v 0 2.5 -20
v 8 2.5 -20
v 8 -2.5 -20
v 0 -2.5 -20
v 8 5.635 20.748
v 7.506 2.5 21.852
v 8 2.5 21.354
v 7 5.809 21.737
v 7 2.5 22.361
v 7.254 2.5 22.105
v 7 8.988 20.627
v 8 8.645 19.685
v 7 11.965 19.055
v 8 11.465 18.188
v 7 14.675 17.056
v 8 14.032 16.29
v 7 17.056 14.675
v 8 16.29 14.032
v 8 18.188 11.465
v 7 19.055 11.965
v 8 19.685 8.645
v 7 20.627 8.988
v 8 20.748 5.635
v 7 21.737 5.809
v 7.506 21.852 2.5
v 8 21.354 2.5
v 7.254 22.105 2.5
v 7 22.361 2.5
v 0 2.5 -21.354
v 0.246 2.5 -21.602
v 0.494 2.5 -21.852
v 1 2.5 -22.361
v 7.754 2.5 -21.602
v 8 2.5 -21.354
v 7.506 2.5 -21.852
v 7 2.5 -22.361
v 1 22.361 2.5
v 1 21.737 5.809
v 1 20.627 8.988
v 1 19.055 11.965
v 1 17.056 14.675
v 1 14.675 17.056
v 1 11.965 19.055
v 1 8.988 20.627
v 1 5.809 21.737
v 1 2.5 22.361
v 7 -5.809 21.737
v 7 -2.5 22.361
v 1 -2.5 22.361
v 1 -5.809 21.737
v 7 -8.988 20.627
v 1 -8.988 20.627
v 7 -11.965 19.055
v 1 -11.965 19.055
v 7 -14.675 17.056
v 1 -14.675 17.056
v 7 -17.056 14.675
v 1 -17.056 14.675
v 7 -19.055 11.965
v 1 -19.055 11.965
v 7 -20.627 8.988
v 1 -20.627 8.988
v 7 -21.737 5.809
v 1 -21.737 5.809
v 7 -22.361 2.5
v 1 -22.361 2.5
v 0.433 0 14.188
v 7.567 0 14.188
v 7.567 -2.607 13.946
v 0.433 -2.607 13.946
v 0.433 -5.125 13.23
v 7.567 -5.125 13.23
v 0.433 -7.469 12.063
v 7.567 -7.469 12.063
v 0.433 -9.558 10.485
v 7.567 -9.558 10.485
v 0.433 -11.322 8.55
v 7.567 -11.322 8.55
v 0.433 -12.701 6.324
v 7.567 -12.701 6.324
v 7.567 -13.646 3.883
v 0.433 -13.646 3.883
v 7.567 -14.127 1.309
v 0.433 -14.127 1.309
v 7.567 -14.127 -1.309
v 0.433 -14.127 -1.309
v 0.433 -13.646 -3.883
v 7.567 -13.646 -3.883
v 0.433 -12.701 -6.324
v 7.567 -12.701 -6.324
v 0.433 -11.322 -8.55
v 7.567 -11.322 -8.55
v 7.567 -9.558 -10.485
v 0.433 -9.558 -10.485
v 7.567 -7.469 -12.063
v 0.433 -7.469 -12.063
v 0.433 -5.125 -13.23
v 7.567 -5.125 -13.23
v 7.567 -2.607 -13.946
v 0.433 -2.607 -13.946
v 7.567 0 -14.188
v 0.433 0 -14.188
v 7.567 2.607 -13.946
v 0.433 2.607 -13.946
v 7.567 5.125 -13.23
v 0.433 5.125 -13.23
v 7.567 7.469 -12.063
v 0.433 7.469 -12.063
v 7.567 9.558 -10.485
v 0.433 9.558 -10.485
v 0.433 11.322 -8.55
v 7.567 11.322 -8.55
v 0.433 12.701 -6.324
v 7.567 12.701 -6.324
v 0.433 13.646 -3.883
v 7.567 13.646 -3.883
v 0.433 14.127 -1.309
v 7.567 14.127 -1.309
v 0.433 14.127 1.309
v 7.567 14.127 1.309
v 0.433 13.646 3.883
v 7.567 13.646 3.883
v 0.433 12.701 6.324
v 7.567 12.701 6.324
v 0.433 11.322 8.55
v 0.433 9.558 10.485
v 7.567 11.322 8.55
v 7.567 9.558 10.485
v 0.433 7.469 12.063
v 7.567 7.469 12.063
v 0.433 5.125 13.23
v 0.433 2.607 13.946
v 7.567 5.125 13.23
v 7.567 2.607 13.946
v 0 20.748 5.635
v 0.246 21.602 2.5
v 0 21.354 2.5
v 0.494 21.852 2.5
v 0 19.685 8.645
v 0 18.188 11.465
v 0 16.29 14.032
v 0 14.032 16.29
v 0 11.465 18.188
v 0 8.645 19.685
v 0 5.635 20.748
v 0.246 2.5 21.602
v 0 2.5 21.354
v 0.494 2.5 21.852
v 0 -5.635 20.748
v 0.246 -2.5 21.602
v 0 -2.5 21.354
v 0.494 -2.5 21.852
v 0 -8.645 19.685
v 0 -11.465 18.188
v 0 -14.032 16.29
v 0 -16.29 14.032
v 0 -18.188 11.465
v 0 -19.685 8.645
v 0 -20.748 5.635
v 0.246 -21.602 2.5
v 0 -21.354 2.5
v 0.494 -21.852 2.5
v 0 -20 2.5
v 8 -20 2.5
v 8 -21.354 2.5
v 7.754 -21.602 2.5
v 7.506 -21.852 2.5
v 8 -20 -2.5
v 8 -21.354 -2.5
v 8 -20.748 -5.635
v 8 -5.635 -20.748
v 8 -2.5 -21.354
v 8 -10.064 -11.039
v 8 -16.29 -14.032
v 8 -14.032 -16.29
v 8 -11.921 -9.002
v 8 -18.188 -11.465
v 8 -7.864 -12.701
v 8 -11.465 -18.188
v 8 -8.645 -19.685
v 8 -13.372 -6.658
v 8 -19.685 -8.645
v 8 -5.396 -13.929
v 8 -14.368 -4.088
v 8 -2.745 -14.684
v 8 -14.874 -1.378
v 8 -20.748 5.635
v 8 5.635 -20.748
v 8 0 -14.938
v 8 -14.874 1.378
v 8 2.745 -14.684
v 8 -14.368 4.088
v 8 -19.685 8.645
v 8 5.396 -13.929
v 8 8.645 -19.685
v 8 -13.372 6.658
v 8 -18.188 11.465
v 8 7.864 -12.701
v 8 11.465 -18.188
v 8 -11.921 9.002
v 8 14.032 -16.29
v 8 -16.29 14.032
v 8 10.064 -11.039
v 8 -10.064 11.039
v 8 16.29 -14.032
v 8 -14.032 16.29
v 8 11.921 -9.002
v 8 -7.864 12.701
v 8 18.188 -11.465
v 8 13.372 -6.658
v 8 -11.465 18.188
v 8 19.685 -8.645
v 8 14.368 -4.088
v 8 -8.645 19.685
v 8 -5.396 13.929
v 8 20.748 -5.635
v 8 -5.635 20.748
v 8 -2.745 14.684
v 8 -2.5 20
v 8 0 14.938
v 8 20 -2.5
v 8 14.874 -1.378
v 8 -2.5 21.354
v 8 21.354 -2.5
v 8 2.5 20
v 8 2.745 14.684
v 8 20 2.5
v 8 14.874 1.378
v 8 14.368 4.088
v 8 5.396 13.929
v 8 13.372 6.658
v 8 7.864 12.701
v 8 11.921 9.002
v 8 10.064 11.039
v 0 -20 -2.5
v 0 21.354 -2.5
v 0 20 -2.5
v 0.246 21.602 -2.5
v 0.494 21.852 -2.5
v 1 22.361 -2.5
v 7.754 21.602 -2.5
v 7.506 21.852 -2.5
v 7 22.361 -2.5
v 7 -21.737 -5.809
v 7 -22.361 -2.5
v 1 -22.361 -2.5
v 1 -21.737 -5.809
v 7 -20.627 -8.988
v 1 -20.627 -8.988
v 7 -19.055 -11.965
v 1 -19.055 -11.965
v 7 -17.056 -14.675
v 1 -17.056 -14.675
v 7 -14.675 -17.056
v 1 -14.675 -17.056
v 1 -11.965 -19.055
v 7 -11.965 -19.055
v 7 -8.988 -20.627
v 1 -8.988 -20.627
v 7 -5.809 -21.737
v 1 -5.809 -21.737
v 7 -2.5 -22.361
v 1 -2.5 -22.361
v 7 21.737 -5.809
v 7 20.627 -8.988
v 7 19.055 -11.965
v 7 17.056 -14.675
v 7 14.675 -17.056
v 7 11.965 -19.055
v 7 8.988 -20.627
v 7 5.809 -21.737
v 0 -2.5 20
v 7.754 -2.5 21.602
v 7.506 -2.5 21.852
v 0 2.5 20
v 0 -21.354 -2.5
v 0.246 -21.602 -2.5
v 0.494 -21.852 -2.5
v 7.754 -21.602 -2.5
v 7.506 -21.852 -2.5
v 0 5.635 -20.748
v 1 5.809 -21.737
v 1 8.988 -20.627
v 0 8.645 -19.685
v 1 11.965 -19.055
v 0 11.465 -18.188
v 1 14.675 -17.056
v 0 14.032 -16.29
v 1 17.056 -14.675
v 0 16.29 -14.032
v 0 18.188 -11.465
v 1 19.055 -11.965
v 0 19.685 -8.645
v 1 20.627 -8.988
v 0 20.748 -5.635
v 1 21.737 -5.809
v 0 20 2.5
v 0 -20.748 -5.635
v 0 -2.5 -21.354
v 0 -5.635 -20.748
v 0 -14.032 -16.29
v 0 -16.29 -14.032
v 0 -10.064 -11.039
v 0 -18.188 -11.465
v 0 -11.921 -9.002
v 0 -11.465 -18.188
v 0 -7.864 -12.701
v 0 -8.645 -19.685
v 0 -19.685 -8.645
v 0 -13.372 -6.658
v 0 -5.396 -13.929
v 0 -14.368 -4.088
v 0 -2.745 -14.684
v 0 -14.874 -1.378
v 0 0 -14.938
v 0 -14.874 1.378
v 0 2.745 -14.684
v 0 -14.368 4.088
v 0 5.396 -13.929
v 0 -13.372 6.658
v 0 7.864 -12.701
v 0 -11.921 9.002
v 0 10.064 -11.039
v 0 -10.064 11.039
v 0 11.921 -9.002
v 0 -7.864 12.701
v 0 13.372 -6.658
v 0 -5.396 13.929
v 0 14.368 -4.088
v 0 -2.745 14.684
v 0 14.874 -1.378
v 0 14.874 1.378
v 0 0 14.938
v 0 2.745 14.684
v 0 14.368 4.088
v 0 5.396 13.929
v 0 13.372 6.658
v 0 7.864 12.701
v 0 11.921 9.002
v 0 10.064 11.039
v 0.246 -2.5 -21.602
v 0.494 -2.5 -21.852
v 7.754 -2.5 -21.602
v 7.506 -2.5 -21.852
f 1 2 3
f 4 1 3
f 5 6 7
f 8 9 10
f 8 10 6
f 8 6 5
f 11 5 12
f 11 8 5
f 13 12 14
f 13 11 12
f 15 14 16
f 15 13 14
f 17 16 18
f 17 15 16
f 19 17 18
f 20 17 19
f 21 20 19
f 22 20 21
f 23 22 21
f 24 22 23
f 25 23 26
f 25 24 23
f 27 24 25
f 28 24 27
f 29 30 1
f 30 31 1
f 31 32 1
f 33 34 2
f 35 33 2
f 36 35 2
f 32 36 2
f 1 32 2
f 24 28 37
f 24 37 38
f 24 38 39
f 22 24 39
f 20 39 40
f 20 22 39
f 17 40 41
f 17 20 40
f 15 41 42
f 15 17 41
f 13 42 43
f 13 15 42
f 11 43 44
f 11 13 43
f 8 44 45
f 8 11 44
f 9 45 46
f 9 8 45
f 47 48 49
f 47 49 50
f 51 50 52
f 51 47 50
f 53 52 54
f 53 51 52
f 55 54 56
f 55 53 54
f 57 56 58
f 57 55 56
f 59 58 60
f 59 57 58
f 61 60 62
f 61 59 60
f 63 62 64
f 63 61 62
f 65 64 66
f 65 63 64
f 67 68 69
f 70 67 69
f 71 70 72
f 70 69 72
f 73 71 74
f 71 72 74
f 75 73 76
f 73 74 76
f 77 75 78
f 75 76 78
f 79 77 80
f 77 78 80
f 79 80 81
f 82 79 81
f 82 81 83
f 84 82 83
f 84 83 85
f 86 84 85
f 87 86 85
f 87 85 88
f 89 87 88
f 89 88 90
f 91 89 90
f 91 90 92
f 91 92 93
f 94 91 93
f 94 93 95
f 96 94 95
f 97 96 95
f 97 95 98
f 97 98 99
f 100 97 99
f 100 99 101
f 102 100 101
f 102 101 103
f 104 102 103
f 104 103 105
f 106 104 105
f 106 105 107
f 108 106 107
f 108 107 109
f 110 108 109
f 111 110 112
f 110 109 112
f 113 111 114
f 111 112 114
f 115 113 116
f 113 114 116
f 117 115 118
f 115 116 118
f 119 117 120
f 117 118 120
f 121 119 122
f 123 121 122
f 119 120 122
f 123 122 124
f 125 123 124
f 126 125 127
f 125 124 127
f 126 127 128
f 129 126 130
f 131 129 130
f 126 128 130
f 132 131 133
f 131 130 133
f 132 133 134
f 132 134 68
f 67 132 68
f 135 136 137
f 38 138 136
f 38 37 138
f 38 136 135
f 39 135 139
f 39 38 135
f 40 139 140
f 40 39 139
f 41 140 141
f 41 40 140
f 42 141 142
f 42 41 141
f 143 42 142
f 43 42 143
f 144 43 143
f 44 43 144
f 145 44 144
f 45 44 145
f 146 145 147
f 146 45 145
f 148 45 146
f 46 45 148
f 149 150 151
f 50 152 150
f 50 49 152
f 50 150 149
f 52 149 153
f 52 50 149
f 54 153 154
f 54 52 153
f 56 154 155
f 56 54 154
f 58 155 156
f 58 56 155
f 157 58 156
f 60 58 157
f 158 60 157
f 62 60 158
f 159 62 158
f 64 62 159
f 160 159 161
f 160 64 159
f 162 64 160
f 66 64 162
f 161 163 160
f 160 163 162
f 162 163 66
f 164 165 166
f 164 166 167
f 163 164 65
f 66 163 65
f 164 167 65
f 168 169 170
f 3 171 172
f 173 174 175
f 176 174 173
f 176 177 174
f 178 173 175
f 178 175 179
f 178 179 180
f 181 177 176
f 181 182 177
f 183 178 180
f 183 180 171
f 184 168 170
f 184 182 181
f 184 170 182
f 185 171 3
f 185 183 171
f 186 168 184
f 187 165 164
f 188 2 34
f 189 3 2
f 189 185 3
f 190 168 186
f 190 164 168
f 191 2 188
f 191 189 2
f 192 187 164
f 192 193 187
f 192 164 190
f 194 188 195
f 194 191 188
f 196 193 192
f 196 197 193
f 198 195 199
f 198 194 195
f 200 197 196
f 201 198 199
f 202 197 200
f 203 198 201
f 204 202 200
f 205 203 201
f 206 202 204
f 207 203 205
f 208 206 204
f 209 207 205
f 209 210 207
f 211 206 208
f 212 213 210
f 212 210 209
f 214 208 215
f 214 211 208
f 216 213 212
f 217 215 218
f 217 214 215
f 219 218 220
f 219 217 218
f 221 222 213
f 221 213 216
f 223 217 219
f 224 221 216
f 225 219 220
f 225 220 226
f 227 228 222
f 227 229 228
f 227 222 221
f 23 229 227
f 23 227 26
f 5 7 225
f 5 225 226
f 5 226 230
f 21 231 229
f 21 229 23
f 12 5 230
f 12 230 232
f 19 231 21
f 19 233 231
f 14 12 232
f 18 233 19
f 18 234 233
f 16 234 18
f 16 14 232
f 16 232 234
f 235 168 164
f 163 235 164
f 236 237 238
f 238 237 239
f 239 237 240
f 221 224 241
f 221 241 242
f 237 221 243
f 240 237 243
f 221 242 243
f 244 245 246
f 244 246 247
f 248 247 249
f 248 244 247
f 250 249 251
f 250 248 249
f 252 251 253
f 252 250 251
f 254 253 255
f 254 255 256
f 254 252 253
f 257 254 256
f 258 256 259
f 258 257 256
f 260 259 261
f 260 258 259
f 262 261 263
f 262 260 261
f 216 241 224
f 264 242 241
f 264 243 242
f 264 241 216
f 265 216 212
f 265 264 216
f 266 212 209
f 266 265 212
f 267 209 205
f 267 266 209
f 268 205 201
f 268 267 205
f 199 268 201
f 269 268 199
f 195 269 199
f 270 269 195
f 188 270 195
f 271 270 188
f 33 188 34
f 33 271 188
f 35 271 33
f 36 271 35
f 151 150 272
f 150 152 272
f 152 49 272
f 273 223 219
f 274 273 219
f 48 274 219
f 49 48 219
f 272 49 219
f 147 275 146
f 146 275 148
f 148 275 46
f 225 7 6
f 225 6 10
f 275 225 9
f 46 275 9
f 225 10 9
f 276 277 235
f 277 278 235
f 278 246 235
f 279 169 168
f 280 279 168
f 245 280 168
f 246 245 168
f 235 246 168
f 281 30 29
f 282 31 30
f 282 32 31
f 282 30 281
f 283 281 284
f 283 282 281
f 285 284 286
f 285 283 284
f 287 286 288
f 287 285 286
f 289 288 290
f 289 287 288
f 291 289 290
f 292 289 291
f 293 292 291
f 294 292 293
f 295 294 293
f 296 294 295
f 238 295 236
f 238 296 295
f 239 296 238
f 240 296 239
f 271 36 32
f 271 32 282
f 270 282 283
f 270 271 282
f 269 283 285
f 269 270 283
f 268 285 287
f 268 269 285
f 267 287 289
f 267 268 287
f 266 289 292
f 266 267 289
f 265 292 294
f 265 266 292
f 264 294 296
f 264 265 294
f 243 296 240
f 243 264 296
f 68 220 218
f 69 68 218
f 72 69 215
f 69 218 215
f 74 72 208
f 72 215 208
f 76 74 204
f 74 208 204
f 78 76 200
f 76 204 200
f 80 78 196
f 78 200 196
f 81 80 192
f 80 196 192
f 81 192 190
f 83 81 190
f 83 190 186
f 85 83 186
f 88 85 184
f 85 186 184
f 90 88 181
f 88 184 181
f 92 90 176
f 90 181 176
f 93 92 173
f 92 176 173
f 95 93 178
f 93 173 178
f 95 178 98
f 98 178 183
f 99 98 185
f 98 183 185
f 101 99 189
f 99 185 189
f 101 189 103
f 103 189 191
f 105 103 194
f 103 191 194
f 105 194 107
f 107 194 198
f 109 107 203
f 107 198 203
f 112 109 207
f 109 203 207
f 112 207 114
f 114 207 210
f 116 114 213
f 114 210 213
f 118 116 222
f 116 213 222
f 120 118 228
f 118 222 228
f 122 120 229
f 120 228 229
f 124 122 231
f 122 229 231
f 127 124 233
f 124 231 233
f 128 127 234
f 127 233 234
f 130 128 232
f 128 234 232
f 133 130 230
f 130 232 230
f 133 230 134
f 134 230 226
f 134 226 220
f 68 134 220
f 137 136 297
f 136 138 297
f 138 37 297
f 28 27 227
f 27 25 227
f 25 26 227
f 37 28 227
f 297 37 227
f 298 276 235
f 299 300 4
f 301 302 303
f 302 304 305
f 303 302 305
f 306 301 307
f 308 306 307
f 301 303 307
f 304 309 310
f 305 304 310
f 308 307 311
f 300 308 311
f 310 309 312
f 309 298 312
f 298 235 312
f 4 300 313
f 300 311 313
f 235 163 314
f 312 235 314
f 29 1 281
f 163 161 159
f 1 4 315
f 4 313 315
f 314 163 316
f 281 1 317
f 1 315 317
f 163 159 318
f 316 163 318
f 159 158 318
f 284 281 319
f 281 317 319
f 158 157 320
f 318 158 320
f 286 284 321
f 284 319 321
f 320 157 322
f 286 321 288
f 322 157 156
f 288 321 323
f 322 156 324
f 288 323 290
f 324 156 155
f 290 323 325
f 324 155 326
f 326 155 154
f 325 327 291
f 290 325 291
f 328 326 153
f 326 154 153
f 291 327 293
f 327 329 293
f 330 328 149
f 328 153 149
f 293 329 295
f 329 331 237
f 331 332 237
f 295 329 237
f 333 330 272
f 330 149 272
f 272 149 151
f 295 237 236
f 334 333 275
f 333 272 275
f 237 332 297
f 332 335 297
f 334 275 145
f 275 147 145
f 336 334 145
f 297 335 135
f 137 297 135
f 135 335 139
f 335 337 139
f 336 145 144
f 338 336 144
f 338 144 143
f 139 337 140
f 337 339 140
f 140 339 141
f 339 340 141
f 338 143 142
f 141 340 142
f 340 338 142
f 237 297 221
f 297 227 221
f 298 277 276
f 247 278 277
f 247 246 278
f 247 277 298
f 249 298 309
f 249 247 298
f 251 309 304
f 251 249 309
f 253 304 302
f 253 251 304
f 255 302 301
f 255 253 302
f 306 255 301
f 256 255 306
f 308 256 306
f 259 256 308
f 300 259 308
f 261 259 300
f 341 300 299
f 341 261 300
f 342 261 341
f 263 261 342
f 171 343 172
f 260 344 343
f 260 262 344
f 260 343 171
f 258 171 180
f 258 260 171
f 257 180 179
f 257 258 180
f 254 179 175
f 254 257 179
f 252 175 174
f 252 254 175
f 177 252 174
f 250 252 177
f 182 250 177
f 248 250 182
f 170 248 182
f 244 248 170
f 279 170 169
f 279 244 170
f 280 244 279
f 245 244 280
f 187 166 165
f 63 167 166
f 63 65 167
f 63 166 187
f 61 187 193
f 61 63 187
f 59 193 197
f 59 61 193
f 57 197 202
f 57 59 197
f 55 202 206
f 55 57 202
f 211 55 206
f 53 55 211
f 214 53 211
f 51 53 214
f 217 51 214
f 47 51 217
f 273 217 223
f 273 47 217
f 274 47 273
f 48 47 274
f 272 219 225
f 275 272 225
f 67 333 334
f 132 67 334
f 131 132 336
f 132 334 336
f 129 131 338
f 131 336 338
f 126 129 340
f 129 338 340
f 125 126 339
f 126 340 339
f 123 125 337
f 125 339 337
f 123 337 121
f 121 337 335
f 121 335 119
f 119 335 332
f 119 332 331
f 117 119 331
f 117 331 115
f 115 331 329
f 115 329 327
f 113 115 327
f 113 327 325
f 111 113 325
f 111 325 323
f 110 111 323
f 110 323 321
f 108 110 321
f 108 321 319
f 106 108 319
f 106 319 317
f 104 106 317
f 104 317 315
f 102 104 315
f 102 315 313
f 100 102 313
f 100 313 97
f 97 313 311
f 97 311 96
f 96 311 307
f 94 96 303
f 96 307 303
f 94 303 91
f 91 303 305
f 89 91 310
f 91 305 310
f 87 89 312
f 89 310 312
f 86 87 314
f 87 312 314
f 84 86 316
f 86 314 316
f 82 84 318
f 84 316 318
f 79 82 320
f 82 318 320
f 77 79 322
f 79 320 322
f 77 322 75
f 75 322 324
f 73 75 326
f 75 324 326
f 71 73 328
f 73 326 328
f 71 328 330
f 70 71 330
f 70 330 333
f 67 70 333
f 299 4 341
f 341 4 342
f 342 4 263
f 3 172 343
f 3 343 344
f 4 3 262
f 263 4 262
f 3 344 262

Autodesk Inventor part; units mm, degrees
ref_plane "YZ Plane" through (0, 0, 0) normal (1, 0, 0) x (0, 1, 0)
ref_plane "XZ Plane" through (0, 0, 0) normal (0, 1, 0) x (-1, 0, 0)
sketch "草图1" plane through (0, 0, 0) normal (0, 0, 1) x (1, 0, 0)
  line L0 (0, 0) -> (8, 0)
  line L1 (0, 0) -> (0, 22.5)
  line L2 (0, 22.5) -> (8, 22.5)
  line L3 (8, 22.5) -> (8, 0)
  line L4 (0, 27) -> (0, -4.5) projected
  line L5 (-1.6, 0) -> (9.6, 0) projected
  dimension "d1" = 45
  dimension "d2" = 8
revolve "轴承体" add sketch "草图1" angle 360 about axis through (0, 0, 0) along (1, 0, 0)
sketch "草图2" plane through (0, 0, 0) normal (-1, 0, 0) x (0, 0, 1)
  circle A0 centre (0, 0) radius 22.5 projected
  point P0 (0, 0)
hole "螺纹" at (0, 0, 0) direction (1, 0, 0) diameter 28.376 end through all thread size "M30x1.5" class "6H" standard "GB Metric profile"
sketch "草图3" plane through (8, 0, 0) normal (1, 0, 0) x (0, 0, -1)
  circle A0 centre (0, 0) radius 22.5 projected
  line L0 (-2.5, 22.3607) -> (-2.5, 20)
  line L1 (-2.5, 20) -> (2.5, 20)
  line L2 (2.5, 20) -> (2.5, 22.3607)
  line L3 (0, -31.5) -> (0, 31.5) projected
  line L4 (-31.5, 0) -> (31.5, 0) projected
  dimension "d12" = 2.5
  dimension "d13" = 2.5
  dimension "d14" = 20
extrude "沟槽1" cut sketch "草图3" against normal through all contours L2 L1 L3 A0 | L3 L1 L0 A0
pattern_circular "IDS_ARRAYGROOVE{1}" count 4 over 360 about axis through (-10, 0, 0) along (1, 0, 0) of "沟槽1"
chamfer "倒角1" distance 1 angle 45 4 edges at (0, 15.9099, -15.9099) (0, 15.9099, 15.9099) (0, -15.9099, -15.9099) (0, -15.9099, 15.9099) measured on face at (0, -17.8541, -8.1385)
chamfer "倒角2" distance 1 angle 45 4 edges at (8, 15.9099, 15.9099) (8, 15.9099, -15.9099) (8, -15.9099, -15.9099) (8, -15.9099, 15.9099) measured on face at (8, -17.8541, -8.1385)
chamfer "倒角3" distance 0.75 angle 30 1 edges at (8, 0, -14.188) measured on face at (8, 17.2423, 7.8853)
chamfer "倒角4" distance 0.75 angle 30 1 edges at (0, 0, -14.188) measured on face at (0, 17.2423, 7.8853)
ref_plane "Work Plane1" through (64.1405, 0, 0) normal (0, 1, 0) x (-1, 0, 0)
equation "\"d1\" = SD2"
equation "\"d2\" = KOH"
equation "\"d12\" = 0.5 * SNB"
equation "\"d13\" = 0.5 * SNB"
equation "\"d14\" = 0.5 * SD2 - SNT"
equation "\"d10\" = -0.5 * LADI + 0.5 * SD2"
equation "\"d11\" = FAWI"
equation "\"d41\" = -0.5 * LADI + 0.5 * SD2"
equation "\"d25\" = -0.5 * LADI + 0.5 * SD2"
equation "\"d27\" = FAWI"
equation "\"d42\" = -0.5 * LADI + 0.5 * SD2"
equation "\"d18\" = 0.025 * NND"
equation "\"d43\" = 0.025 * NND"
equation "\"d20\" = 0.025 * NND"
equation "\"d44\" = 0.025 * NND"
equation "\"KOH\" = 8"
equation "\"SD2\" = 45"
equation "\"SNB\" = 5"
equation "\"SNT\" = 2.5"
equation "\"LADI\" = 43"
equation "\"FAWI\" = 45deg"
equation "\"GUL\" = 0.61345 * PTC"
equation "\"PHH\" = 1"
equation "\"TOA\" = 30deg"
equation "\"PTC\" = 1.5"
equation "\"FAWI1\" = 60deg"
equation "\"GAL\" = 0.61345 * PTC"
equation "\"GD1\" = THREADDIA - 1.2269 * PTC"
equation "\"NND\" = 30"
equation "\"THREADDIA\" = 30"
properties part number "螺母 GB 810 M30 x 1.5" material "钢，软"
